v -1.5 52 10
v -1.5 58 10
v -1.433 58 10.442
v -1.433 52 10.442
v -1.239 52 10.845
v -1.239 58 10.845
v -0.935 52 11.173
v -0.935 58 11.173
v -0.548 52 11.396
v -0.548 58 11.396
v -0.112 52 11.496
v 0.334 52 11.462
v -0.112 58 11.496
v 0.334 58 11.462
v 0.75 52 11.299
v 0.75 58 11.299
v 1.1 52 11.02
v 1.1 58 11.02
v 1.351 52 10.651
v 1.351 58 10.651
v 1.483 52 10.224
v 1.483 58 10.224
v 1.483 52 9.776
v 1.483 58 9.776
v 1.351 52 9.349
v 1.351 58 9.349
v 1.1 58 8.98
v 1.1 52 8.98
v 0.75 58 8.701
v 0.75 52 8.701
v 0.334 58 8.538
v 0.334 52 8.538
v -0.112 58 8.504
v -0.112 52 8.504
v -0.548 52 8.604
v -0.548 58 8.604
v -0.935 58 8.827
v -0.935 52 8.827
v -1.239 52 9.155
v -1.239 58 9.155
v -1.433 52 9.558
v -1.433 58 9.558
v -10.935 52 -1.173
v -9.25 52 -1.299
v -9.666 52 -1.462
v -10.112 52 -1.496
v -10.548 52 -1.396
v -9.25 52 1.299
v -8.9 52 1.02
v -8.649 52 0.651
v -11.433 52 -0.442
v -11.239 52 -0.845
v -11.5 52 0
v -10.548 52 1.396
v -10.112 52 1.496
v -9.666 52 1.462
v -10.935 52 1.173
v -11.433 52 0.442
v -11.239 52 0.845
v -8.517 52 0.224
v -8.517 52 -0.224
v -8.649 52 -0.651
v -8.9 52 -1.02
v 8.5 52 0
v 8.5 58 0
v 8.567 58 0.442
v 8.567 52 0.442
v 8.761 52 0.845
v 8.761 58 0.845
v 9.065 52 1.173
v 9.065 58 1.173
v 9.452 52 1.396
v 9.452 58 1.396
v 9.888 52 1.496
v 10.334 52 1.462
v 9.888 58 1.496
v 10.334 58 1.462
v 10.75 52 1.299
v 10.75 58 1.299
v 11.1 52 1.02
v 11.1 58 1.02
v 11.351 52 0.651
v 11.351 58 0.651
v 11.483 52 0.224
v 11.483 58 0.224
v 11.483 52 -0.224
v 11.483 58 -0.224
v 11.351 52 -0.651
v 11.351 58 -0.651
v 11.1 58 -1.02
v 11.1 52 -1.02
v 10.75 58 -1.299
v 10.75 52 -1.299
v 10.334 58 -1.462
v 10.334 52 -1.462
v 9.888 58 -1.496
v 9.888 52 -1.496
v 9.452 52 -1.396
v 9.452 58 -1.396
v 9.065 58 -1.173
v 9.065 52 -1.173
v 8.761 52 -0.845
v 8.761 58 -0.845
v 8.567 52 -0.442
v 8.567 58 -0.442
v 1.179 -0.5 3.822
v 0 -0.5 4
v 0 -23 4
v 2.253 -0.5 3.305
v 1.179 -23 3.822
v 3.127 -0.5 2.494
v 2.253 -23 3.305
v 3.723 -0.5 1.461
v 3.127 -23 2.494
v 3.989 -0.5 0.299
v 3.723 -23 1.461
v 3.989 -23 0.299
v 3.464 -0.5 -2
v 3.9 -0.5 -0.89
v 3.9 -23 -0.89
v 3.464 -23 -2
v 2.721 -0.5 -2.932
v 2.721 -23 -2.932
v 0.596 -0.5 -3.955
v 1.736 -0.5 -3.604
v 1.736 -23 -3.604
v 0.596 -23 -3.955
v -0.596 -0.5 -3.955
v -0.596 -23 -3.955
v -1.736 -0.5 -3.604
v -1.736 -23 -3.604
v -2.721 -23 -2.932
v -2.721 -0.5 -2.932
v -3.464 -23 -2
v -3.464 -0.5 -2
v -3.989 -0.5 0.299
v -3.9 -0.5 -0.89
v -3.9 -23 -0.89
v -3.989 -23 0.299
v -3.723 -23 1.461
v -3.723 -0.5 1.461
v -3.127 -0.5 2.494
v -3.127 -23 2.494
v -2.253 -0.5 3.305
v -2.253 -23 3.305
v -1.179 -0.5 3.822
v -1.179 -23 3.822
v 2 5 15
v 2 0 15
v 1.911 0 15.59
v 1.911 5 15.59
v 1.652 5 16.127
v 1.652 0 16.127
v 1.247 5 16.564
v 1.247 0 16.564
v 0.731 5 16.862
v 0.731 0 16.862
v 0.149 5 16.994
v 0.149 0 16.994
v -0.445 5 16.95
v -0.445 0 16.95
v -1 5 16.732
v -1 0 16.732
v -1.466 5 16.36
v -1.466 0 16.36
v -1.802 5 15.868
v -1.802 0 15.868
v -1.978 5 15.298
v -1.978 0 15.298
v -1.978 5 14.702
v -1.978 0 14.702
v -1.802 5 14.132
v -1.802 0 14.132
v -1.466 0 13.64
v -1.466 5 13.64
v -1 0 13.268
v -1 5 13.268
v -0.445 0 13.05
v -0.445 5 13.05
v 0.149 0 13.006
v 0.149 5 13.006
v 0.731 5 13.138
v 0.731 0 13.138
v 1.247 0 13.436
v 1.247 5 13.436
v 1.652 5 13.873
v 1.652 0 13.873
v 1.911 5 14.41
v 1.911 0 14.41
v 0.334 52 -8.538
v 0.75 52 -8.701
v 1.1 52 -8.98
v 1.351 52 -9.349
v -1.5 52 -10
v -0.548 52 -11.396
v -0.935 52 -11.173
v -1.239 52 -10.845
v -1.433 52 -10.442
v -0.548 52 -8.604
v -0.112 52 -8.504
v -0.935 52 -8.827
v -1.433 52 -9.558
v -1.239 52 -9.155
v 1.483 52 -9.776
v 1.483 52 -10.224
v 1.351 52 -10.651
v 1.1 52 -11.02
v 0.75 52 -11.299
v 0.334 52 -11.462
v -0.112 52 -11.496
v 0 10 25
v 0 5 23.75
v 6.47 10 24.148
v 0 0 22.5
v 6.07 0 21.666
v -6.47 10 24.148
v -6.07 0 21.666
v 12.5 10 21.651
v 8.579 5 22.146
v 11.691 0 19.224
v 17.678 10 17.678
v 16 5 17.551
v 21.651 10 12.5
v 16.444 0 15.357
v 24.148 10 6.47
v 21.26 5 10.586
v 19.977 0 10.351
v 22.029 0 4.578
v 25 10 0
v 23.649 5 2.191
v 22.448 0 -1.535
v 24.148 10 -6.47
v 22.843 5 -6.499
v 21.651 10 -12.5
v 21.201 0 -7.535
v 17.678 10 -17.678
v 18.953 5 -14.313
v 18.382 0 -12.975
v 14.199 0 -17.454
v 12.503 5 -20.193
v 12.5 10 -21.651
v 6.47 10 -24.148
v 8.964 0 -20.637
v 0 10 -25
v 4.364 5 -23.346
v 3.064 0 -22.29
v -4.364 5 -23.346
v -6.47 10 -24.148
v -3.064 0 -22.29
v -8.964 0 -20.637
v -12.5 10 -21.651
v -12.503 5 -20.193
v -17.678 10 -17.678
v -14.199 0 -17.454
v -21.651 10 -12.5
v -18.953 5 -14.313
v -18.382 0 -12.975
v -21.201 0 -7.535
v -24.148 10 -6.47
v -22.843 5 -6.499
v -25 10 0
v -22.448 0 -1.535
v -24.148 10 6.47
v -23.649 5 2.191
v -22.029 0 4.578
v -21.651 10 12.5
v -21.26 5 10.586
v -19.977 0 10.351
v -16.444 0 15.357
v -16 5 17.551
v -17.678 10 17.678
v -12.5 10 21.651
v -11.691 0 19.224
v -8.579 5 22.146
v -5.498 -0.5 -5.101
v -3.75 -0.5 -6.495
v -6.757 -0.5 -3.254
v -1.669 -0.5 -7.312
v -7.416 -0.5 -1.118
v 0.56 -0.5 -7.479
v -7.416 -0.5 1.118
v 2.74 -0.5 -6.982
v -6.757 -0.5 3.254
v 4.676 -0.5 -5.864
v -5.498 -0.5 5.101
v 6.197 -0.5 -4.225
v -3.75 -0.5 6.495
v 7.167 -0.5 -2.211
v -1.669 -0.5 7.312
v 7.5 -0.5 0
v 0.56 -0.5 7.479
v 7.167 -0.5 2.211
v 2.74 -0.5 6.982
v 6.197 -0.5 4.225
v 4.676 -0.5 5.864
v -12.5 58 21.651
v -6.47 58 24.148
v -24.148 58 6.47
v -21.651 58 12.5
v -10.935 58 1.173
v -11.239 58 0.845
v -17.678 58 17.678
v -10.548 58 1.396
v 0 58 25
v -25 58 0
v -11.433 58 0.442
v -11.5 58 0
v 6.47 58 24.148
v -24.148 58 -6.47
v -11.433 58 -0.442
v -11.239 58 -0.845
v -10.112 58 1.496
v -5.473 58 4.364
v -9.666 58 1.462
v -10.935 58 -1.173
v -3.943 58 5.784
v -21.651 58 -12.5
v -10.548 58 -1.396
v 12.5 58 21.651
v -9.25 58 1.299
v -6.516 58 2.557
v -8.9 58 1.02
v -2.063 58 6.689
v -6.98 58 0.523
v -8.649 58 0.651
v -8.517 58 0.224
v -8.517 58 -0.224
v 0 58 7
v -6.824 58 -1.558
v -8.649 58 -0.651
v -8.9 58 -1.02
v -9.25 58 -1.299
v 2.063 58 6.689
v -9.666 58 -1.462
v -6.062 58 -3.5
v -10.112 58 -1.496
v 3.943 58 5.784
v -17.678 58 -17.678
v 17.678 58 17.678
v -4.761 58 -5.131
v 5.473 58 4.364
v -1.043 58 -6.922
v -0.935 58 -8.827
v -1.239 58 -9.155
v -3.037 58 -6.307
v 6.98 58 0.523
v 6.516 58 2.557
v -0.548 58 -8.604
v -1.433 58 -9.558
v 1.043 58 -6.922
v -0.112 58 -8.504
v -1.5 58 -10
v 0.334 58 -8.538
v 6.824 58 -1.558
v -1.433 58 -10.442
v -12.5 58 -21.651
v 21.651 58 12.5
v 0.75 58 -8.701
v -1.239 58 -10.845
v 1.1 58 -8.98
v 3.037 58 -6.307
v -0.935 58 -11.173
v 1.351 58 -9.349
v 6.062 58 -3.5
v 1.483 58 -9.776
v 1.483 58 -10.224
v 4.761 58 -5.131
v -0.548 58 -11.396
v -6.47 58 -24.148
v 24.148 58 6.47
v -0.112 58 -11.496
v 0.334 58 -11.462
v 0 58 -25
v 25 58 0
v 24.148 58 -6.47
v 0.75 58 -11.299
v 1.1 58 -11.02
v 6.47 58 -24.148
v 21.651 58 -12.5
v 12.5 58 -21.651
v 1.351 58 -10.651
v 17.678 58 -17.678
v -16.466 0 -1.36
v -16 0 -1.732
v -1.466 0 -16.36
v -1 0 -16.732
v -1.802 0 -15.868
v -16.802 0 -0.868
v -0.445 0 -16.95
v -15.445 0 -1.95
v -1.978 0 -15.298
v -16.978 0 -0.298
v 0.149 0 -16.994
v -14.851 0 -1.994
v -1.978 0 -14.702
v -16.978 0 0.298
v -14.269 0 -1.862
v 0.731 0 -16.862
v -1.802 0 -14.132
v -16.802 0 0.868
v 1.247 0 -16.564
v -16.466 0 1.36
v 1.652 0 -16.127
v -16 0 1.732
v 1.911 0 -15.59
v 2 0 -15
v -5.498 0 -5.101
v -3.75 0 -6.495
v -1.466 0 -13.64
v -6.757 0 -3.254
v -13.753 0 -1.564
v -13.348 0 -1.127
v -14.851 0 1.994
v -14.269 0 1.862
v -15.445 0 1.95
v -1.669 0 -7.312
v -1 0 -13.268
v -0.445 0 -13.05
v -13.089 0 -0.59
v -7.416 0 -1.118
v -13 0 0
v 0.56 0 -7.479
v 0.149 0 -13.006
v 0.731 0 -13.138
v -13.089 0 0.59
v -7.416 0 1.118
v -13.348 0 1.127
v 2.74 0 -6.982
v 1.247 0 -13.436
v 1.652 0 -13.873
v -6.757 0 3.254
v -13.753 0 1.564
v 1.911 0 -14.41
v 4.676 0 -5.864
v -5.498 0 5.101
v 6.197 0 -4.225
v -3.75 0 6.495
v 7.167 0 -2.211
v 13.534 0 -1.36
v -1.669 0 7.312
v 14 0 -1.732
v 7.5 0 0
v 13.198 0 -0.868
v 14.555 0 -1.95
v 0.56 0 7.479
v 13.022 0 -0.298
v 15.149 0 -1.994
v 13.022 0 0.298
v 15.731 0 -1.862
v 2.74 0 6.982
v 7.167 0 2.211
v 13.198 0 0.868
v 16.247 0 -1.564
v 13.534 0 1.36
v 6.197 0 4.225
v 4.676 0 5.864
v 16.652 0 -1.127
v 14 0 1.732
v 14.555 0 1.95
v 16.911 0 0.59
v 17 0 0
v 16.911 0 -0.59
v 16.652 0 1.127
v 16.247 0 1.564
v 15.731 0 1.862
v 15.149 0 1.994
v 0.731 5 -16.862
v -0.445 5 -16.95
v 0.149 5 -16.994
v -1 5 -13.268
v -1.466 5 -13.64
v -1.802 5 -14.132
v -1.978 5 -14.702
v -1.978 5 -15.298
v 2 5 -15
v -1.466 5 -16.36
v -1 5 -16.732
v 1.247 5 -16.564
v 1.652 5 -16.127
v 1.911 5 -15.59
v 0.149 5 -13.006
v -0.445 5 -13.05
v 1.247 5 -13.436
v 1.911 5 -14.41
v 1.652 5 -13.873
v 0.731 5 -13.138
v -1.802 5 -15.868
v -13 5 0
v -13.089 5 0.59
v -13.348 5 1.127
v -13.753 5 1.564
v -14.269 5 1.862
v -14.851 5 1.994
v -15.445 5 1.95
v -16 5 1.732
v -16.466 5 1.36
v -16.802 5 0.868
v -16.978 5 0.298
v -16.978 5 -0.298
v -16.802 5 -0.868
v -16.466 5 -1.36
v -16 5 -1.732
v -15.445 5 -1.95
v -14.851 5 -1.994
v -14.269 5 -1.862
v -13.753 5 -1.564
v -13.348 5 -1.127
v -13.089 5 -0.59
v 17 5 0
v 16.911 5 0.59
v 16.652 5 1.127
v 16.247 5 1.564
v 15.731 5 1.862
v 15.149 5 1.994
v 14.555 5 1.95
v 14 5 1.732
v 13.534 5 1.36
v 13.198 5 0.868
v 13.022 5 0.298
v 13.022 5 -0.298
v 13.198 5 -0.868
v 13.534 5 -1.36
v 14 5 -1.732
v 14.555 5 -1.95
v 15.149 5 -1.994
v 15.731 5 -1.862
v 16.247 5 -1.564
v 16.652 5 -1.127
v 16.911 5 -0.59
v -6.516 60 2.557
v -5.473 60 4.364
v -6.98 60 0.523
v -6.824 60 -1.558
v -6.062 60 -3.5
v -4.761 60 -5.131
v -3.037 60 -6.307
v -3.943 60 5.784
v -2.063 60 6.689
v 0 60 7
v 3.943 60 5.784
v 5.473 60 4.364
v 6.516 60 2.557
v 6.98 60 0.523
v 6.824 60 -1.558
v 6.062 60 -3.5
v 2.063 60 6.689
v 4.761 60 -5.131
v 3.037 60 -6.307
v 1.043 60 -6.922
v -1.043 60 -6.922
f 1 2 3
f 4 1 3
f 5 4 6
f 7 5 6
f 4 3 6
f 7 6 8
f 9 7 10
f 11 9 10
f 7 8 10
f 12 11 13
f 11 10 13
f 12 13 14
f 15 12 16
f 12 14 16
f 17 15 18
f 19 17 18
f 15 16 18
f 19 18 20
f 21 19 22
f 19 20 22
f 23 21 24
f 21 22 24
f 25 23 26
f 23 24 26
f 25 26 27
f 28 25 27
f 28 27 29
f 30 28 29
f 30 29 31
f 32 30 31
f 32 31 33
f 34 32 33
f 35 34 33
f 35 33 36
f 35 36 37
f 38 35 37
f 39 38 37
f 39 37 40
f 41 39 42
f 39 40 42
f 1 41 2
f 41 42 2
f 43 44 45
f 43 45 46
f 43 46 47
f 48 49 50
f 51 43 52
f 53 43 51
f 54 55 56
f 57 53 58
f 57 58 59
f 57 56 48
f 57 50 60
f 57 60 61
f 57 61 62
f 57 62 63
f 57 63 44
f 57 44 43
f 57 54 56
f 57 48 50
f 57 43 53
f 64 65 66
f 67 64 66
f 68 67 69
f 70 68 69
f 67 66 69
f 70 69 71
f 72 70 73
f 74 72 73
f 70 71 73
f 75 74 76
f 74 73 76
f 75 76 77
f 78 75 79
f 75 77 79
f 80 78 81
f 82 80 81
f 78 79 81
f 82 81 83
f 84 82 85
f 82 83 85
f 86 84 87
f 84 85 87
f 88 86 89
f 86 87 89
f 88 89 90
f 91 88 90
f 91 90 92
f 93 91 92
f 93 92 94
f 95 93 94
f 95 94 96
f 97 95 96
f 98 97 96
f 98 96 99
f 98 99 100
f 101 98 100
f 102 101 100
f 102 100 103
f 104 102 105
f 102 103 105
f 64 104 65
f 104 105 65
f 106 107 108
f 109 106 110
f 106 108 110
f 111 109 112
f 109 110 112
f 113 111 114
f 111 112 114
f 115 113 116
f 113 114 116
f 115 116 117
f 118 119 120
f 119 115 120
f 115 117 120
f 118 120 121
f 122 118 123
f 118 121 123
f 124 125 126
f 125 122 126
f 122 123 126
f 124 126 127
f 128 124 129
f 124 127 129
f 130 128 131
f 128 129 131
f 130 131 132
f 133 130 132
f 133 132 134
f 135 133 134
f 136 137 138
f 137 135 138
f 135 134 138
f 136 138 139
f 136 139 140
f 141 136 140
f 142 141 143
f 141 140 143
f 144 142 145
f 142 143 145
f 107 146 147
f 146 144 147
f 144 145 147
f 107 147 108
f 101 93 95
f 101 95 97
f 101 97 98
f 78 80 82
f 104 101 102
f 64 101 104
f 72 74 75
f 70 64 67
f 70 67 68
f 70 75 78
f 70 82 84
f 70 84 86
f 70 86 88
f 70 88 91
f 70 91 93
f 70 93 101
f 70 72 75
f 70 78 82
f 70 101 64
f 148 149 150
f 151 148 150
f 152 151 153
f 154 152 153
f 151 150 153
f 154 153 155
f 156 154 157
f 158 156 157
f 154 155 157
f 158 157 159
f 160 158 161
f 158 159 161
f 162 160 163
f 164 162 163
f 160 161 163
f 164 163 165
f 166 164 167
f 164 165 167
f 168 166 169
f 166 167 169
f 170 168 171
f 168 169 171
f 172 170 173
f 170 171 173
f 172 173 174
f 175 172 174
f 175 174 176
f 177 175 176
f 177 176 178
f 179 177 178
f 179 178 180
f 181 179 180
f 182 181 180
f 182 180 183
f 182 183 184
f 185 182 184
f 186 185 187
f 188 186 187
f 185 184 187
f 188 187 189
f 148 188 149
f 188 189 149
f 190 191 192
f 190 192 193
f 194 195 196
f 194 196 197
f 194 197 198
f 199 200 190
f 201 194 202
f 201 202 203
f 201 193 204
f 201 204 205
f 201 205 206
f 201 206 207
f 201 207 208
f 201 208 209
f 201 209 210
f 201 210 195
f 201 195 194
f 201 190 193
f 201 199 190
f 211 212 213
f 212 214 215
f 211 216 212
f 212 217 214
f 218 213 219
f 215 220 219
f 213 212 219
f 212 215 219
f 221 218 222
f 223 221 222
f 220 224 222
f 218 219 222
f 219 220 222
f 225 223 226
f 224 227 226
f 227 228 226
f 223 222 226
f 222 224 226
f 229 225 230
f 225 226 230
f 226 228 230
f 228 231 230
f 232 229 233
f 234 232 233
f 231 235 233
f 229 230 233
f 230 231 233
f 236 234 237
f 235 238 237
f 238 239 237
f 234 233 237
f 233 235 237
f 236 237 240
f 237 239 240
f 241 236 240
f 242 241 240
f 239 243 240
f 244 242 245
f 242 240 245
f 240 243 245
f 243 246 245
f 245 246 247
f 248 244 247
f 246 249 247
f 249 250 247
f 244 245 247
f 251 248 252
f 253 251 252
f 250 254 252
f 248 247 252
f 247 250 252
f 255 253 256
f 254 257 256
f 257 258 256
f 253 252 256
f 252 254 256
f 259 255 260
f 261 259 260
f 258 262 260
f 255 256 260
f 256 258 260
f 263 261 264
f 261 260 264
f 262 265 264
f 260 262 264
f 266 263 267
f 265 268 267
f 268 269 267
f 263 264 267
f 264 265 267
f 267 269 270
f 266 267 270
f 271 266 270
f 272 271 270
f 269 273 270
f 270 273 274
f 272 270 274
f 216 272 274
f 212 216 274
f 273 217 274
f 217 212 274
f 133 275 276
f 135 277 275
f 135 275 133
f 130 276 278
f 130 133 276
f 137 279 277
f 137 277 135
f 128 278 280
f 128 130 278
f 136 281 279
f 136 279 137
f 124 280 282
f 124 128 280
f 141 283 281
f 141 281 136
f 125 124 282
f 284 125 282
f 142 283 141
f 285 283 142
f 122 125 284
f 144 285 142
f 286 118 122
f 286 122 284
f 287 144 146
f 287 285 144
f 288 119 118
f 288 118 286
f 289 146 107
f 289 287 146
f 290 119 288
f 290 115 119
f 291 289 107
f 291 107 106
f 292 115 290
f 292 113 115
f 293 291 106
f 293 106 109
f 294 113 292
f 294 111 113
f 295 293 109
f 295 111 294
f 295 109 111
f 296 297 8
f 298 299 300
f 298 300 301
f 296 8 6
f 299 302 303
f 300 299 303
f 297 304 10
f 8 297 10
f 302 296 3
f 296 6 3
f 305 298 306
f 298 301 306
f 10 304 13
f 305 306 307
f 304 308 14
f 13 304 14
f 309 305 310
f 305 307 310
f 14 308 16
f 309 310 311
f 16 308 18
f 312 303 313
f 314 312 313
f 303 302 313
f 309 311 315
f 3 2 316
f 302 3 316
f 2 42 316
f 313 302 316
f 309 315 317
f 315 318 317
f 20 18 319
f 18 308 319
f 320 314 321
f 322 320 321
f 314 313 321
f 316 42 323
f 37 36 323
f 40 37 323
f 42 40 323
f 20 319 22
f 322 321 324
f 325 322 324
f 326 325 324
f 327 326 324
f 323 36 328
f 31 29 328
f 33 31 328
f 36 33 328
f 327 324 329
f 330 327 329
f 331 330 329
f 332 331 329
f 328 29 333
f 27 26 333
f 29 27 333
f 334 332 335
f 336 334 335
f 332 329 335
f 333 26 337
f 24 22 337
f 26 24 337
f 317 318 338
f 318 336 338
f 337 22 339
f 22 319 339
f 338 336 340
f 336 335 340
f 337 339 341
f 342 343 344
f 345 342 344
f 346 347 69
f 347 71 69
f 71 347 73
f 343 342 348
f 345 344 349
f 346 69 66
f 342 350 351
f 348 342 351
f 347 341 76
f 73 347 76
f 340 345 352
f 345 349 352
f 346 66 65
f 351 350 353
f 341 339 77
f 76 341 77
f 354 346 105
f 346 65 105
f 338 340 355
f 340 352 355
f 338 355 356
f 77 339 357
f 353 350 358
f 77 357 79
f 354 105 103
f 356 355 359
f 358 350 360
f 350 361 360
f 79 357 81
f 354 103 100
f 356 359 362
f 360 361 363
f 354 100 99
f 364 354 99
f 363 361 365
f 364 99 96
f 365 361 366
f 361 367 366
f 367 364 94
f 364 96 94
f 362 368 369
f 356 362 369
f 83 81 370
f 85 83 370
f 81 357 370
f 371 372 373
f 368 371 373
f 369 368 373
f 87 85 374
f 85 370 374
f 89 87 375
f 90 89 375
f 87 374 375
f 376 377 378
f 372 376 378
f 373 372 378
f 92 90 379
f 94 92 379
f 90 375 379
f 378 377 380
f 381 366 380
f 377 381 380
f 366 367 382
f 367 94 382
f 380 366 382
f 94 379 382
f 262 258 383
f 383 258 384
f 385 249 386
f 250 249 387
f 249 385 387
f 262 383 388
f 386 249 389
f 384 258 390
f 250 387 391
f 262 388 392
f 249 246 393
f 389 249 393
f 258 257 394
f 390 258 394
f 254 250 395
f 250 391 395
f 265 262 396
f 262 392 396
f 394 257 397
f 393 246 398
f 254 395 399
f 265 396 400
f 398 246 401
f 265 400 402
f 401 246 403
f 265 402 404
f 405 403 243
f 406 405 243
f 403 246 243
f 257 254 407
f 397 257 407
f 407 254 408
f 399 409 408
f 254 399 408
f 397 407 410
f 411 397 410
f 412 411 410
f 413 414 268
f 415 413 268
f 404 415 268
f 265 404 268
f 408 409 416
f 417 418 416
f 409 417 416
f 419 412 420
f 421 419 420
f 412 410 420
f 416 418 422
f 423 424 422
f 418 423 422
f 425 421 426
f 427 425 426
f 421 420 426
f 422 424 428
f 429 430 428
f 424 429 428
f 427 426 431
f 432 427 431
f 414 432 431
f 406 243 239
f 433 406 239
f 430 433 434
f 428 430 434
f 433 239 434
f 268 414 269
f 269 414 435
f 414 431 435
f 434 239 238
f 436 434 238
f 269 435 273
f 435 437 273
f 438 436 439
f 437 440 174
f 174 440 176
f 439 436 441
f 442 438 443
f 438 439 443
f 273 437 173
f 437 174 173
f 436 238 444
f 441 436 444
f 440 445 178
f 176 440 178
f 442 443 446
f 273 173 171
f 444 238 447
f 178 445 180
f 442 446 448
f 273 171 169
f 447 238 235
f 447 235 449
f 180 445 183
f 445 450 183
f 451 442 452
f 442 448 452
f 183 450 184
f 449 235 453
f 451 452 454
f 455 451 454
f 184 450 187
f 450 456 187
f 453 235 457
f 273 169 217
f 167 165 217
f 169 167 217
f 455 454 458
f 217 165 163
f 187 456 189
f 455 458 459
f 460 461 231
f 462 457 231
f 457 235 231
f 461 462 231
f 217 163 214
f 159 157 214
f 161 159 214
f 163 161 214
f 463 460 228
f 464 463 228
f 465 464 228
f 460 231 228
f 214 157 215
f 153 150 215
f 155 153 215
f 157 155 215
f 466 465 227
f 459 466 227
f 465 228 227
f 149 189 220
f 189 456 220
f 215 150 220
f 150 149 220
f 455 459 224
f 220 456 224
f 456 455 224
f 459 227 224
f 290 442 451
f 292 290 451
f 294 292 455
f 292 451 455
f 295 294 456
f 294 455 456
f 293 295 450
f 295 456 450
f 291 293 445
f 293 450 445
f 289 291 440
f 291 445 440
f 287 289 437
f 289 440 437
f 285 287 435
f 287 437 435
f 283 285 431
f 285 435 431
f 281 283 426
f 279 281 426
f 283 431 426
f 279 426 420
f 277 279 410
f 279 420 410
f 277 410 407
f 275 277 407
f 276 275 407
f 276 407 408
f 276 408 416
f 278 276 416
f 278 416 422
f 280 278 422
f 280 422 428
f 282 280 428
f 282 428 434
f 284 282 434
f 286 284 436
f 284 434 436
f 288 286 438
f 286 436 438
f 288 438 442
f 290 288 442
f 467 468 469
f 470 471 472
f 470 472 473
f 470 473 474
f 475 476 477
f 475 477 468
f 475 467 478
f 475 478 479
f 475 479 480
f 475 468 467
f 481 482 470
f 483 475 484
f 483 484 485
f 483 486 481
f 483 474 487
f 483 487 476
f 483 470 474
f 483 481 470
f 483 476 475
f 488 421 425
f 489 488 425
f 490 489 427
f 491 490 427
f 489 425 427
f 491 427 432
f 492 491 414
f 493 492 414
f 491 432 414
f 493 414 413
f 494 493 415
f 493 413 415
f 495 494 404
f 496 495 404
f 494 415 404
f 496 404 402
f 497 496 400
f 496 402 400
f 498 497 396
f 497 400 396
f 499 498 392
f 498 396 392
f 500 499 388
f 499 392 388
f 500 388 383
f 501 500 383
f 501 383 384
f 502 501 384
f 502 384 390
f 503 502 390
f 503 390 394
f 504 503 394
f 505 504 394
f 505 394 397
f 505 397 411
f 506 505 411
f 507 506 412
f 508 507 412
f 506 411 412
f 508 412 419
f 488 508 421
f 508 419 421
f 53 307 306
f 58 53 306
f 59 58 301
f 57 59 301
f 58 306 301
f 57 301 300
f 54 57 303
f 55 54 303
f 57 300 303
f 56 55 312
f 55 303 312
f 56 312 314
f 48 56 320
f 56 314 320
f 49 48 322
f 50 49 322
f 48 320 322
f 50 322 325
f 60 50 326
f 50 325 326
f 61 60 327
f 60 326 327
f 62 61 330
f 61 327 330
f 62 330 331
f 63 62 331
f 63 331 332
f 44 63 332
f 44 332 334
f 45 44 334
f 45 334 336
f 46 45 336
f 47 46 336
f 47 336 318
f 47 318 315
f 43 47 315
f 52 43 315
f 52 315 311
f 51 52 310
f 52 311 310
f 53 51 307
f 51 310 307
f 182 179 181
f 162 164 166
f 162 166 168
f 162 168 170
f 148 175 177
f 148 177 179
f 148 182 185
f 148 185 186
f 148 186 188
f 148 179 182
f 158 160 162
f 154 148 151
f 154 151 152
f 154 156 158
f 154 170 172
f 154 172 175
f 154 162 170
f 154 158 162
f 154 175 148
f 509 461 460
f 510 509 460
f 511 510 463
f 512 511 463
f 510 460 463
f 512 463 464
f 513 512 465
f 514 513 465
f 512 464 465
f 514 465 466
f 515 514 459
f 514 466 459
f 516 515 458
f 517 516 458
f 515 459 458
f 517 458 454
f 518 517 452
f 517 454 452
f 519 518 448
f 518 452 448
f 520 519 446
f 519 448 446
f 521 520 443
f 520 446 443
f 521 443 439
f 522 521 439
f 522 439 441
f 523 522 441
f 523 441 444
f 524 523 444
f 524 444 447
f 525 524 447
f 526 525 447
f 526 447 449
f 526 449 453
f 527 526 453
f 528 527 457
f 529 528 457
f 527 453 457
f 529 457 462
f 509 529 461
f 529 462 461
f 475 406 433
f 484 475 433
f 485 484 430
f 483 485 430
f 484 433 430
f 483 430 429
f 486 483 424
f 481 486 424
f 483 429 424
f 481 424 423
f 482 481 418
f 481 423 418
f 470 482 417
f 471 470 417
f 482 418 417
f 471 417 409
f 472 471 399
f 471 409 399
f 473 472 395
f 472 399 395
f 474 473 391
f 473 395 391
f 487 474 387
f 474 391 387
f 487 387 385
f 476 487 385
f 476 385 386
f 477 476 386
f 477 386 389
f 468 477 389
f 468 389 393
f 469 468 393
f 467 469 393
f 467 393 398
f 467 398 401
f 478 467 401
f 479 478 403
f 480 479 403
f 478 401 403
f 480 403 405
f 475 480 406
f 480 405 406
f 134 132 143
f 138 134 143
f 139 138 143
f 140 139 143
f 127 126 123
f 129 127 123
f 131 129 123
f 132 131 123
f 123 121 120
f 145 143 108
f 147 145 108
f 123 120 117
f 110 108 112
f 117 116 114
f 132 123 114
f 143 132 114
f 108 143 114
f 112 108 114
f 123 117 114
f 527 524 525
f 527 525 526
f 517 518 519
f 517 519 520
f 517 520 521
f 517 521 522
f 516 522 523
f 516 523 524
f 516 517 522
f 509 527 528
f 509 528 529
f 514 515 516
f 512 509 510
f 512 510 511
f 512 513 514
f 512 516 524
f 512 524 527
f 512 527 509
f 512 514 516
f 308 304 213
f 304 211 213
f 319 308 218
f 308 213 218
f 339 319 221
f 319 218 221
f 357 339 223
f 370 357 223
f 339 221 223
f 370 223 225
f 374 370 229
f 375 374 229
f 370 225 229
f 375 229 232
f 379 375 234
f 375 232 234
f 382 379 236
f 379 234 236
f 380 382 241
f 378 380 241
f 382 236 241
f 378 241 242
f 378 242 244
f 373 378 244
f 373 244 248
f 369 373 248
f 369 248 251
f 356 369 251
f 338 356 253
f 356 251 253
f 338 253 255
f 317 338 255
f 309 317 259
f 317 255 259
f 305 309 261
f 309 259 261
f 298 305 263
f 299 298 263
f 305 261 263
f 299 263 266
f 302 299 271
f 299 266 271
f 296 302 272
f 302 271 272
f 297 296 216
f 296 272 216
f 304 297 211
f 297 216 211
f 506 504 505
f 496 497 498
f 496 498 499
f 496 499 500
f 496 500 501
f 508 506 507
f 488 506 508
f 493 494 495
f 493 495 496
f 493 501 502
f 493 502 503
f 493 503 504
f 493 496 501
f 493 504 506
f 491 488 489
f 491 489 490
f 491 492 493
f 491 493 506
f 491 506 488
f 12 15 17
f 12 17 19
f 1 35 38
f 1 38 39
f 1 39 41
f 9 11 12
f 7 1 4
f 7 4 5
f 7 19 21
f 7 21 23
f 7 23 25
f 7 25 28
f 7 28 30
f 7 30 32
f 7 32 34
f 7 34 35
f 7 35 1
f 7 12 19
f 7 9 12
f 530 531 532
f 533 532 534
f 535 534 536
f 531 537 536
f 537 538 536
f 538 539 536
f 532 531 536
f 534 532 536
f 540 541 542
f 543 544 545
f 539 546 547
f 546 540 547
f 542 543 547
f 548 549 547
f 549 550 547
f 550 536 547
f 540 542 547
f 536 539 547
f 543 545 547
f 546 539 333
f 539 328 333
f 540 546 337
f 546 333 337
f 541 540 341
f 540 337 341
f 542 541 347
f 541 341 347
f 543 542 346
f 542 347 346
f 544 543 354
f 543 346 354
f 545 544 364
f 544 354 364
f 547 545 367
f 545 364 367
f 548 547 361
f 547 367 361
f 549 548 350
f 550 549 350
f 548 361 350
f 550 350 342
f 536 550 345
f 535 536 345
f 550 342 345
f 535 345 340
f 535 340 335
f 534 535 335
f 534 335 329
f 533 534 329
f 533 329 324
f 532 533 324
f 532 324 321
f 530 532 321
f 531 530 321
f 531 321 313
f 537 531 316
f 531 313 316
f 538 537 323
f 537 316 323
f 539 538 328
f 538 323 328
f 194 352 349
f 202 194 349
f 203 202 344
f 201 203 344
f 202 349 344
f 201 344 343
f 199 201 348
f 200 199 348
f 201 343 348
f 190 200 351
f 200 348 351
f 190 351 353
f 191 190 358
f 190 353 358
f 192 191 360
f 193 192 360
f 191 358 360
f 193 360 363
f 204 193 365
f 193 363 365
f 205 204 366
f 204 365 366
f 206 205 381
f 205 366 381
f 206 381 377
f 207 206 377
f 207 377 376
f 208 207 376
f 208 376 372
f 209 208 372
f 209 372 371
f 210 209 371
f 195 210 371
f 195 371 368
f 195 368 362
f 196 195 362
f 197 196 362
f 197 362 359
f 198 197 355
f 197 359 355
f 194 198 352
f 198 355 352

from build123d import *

# Parameters (mm, degrees)
F2_R     = 2
F3_DEPTH = 5
F4_R     = 7.5
F5_DEPTH = 0.5
F6_R     = 1.5
F7_DEPTH = 6


with BuildPart() as f1:
    # F0 (on Right) → F1 (revolve)
    with BuildSketch(Plane.YZ):
        Polygon((10, 25), (0, 22.5), (0, 4), (-23, 4), (-23, 0), (60, 0), (60, 7), (58, 7), (58, 25), align=None)
    revolve(axis=Axis((0, 18.5, 0), (0, 1, 0)))

    # F2 (on face) → F3 (cut)
    with BuildSketch(Plane.XZ):
        with Locations((15, 0)):
            Circle(F2_R)
        with Locations((0, 15)):
            Circle(F2_R)
        with Locations((-15, 0)):
            Circle(F2_R)
        with Locations((0, -15)):
            Circle(F2_R)
    extrude(amount=-F3_DEPTH, mode=Mode.SUBTRACT)

    # F4 (on face) → F5 (join)
    with BuildSketch(Plane.XZ):
        Circle(F4_R)
    extrude(amount=F5_DEPTH)

    # F6 (on face) → F7 (cut)
    with BuildSketch(Plane(origin=(0, 58, 0), x_dir=(-1, 0, 0), z_dir=(0, 1, 0))):
        with Locations((10, 0)):
            Circle(F6_R)
        with Locations((0, 10)):
            Circle(F6_R)
        with Locations((-10, 0)):
            Circle(F6_R)
        with Locations((0, -10)):
            Circle(F6_R)
    extrude(amount=-F7_DEPTH, mode=Mode.SUBTRACT)


solid = f1.part
